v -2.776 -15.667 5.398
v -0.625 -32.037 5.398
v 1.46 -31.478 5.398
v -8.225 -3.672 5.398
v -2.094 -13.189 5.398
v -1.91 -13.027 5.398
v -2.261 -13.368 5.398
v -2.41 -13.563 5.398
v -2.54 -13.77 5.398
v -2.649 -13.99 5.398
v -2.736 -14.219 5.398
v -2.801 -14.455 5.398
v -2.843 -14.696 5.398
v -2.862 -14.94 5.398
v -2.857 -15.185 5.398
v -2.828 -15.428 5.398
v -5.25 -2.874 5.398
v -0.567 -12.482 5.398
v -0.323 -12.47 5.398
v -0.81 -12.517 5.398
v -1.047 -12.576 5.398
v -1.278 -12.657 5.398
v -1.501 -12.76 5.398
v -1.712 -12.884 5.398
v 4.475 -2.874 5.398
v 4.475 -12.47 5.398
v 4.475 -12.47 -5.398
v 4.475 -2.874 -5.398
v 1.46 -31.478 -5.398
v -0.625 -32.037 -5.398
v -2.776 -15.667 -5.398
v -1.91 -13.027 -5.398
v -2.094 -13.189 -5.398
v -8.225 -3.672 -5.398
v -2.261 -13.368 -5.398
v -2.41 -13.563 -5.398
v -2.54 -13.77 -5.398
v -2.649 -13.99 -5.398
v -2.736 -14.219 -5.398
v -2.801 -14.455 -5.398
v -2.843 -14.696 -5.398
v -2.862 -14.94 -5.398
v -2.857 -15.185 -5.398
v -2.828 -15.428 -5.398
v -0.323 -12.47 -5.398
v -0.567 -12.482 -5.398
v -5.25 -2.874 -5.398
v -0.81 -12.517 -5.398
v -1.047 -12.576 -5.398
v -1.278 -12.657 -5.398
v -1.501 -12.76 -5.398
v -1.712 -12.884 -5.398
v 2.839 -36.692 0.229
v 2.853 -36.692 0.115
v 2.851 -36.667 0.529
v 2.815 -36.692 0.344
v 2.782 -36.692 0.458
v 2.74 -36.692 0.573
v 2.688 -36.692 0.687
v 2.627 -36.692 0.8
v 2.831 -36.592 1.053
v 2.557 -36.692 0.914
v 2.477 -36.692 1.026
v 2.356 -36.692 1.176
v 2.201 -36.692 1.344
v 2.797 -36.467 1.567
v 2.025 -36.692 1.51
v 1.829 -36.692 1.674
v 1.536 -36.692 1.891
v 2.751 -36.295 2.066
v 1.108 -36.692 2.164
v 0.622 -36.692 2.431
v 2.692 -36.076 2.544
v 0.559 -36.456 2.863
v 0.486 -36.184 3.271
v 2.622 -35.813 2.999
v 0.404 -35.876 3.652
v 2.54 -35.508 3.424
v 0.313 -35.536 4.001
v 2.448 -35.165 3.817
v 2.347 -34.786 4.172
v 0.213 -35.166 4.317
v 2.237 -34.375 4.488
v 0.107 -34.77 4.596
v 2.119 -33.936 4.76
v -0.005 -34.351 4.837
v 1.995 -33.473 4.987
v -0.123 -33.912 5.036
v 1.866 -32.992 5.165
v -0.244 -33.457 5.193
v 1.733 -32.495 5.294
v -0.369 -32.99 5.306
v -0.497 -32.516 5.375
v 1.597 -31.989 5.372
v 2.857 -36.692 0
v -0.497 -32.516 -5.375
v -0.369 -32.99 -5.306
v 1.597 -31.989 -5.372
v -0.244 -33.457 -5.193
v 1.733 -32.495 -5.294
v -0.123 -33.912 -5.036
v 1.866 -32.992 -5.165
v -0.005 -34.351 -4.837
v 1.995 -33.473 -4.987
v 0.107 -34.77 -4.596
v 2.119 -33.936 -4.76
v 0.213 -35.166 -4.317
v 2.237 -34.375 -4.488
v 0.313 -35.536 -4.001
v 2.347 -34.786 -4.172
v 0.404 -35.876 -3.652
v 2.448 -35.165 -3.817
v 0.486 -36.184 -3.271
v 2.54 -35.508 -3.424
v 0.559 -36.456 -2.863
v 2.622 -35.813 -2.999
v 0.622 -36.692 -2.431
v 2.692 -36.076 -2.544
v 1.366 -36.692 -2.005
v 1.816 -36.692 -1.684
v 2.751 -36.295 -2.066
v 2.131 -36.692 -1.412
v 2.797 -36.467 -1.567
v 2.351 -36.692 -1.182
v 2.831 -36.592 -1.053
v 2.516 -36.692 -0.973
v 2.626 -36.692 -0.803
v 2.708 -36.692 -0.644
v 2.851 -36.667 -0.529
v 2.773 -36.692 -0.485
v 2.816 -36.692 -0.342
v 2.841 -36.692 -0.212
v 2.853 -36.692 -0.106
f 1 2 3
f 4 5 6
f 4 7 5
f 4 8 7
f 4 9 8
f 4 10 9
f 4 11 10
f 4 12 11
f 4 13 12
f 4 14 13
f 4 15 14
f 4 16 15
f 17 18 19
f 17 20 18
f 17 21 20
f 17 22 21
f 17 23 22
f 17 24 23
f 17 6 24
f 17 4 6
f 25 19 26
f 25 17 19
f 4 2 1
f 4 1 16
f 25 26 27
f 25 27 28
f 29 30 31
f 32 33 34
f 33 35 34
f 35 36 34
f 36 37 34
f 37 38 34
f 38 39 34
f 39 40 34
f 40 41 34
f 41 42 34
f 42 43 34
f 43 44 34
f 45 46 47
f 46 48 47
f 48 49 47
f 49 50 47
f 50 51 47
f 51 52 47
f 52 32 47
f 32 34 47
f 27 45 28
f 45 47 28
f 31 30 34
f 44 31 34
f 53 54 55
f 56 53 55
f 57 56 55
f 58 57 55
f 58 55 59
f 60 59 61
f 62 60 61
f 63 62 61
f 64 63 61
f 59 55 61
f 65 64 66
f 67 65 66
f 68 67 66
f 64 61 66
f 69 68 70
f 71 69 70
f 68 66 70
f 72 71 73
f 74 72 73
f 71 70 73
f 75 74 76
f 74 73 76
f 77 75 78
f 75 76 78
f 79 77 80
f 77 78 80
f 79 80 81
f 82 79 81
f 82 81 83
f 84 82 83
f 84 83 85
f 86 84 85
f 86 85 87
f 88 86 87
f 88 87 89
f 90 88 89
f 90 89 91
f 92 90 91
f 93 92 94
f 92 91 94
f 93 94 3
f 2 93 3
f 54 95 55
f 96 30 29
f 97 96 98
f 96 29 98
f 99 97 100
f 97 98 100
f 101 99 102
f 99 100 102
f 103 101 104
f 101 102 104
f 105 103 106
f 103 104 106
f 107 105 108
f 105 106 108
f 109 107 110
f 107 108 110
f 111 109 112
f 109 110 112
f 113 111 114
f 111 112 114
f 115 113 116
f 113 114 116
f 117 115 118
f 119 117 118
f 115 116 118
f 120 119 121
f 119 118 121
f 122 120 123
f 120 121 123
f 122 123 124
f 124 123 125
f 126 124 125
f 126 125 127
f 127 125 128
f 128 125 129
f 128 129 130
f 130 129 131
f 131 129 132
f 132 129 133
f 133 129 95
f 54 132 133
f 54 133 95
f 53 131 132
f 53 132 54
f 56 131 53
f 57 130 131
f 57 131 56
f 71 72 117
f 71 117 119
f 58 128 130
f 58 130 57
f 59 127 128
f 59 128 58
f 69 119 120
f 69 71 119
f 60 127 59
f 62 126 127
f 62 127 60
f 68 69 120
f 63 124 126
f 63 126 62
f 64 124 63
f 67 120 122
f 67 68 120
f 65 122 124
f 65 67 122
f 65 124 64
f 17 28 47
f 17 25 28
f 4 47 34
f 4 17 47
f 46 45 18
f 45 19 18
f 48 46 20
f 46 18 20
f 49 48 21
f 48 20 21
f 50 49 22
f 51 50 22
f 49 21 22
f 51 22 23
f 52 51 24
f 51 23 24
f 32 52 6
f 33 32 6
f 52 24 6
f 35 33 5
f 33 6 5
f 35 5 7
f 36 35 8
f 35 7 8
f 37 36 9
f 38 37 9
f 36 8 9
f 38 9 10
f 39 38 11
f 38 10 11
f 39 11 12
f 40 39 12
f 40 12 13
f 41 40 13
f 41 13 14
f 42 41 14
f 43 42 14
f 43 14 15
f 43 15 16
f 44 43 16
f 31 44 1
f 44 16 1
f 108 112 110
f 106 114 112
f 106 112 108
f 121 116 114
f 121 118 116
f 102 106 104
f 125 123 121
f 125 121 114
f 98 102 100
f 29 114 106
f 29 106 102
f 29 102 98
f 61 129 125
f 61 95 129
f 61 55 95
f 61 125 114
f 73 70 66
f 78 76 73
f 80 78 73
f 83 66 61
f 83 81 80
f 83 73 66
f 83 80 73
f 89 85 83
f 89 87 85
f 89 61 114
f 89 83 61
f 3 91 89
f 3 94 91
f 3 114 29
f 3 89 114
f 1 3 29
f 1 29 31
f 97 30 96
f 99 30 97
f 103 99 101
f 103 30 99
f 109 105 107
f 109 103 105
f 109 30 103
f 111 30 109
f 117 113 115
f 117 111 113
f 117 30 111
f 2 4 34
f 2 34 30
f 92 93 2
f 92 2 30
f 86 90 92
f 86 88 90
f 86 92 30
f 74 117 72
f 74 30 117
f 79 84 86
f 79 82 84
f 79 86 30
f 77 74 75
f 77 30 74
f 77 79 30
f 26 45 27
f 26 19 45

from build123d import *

# Parameters (mm, degrees)
BOSS_EXTRUDE1_DEPTH = 5.3975
FILLET1_R           = 2.54
CUT_EXTRUDE1_DEPTH  = 10.795


with BuildPart() as part:
    # Sketch1 → Boss-Extrude1 (new, symmetric)
    with BuildSketch(Plane.XY):
        Polygon((-8.225424052, -3.67171889), (0.622258282, -36.69171889), (2.857419556, -36.69171889), (-3.632754155, -12.470060853), (4.474575948, -12.470060853), (4.474575948, -2.874424181), (-5.24987969, -2.874424181), align=None)
    extrude(amount=BOSS_EXTRUDE1_DEPTH, both=True)

    # Fillet1
    fillet1_edges = [part.edges().sort_by_distance(p)[0] for p in [
        (-3.632754155, -12.470060853, 0),
    ]]
    fillet(fillet1_edges, radius=FILLET1_R)

    # Sketch2 → Cut-Extrude1 (cut)
    with BuildSketch(Plane(origin=(-6.506920982, -1.743524222, 0), x_dir=(0, 0, -1), z_dir=(0.9659258262890691, 0.2588190451025181, 0))):
        with BuildLine():
            Line((-5.3975, -30.783533487), (-9.351765914, -30.783533487))
            Line((-9.351765914, -30.783533487), (-9.351765914, -40.742477504))
            Line((-9.351765914, -40.742477504), (7.77118576, -40.742477504))
            Line((7.77118576, -40.742477504), (7.77118576, -30.783533487))
            Line((7.77118576, -30.783533487), (5.3975, -30.783533487))
            ThreePointArc((5.3975, -30.783533487), (0, -36.181033487), (-5.3975, -30.783533487))
        make_face()
    extrude(amount=-CUT_EXTRUDE1_DEPTH, mode=Mode.SUBTRACT)


solid = part.part
